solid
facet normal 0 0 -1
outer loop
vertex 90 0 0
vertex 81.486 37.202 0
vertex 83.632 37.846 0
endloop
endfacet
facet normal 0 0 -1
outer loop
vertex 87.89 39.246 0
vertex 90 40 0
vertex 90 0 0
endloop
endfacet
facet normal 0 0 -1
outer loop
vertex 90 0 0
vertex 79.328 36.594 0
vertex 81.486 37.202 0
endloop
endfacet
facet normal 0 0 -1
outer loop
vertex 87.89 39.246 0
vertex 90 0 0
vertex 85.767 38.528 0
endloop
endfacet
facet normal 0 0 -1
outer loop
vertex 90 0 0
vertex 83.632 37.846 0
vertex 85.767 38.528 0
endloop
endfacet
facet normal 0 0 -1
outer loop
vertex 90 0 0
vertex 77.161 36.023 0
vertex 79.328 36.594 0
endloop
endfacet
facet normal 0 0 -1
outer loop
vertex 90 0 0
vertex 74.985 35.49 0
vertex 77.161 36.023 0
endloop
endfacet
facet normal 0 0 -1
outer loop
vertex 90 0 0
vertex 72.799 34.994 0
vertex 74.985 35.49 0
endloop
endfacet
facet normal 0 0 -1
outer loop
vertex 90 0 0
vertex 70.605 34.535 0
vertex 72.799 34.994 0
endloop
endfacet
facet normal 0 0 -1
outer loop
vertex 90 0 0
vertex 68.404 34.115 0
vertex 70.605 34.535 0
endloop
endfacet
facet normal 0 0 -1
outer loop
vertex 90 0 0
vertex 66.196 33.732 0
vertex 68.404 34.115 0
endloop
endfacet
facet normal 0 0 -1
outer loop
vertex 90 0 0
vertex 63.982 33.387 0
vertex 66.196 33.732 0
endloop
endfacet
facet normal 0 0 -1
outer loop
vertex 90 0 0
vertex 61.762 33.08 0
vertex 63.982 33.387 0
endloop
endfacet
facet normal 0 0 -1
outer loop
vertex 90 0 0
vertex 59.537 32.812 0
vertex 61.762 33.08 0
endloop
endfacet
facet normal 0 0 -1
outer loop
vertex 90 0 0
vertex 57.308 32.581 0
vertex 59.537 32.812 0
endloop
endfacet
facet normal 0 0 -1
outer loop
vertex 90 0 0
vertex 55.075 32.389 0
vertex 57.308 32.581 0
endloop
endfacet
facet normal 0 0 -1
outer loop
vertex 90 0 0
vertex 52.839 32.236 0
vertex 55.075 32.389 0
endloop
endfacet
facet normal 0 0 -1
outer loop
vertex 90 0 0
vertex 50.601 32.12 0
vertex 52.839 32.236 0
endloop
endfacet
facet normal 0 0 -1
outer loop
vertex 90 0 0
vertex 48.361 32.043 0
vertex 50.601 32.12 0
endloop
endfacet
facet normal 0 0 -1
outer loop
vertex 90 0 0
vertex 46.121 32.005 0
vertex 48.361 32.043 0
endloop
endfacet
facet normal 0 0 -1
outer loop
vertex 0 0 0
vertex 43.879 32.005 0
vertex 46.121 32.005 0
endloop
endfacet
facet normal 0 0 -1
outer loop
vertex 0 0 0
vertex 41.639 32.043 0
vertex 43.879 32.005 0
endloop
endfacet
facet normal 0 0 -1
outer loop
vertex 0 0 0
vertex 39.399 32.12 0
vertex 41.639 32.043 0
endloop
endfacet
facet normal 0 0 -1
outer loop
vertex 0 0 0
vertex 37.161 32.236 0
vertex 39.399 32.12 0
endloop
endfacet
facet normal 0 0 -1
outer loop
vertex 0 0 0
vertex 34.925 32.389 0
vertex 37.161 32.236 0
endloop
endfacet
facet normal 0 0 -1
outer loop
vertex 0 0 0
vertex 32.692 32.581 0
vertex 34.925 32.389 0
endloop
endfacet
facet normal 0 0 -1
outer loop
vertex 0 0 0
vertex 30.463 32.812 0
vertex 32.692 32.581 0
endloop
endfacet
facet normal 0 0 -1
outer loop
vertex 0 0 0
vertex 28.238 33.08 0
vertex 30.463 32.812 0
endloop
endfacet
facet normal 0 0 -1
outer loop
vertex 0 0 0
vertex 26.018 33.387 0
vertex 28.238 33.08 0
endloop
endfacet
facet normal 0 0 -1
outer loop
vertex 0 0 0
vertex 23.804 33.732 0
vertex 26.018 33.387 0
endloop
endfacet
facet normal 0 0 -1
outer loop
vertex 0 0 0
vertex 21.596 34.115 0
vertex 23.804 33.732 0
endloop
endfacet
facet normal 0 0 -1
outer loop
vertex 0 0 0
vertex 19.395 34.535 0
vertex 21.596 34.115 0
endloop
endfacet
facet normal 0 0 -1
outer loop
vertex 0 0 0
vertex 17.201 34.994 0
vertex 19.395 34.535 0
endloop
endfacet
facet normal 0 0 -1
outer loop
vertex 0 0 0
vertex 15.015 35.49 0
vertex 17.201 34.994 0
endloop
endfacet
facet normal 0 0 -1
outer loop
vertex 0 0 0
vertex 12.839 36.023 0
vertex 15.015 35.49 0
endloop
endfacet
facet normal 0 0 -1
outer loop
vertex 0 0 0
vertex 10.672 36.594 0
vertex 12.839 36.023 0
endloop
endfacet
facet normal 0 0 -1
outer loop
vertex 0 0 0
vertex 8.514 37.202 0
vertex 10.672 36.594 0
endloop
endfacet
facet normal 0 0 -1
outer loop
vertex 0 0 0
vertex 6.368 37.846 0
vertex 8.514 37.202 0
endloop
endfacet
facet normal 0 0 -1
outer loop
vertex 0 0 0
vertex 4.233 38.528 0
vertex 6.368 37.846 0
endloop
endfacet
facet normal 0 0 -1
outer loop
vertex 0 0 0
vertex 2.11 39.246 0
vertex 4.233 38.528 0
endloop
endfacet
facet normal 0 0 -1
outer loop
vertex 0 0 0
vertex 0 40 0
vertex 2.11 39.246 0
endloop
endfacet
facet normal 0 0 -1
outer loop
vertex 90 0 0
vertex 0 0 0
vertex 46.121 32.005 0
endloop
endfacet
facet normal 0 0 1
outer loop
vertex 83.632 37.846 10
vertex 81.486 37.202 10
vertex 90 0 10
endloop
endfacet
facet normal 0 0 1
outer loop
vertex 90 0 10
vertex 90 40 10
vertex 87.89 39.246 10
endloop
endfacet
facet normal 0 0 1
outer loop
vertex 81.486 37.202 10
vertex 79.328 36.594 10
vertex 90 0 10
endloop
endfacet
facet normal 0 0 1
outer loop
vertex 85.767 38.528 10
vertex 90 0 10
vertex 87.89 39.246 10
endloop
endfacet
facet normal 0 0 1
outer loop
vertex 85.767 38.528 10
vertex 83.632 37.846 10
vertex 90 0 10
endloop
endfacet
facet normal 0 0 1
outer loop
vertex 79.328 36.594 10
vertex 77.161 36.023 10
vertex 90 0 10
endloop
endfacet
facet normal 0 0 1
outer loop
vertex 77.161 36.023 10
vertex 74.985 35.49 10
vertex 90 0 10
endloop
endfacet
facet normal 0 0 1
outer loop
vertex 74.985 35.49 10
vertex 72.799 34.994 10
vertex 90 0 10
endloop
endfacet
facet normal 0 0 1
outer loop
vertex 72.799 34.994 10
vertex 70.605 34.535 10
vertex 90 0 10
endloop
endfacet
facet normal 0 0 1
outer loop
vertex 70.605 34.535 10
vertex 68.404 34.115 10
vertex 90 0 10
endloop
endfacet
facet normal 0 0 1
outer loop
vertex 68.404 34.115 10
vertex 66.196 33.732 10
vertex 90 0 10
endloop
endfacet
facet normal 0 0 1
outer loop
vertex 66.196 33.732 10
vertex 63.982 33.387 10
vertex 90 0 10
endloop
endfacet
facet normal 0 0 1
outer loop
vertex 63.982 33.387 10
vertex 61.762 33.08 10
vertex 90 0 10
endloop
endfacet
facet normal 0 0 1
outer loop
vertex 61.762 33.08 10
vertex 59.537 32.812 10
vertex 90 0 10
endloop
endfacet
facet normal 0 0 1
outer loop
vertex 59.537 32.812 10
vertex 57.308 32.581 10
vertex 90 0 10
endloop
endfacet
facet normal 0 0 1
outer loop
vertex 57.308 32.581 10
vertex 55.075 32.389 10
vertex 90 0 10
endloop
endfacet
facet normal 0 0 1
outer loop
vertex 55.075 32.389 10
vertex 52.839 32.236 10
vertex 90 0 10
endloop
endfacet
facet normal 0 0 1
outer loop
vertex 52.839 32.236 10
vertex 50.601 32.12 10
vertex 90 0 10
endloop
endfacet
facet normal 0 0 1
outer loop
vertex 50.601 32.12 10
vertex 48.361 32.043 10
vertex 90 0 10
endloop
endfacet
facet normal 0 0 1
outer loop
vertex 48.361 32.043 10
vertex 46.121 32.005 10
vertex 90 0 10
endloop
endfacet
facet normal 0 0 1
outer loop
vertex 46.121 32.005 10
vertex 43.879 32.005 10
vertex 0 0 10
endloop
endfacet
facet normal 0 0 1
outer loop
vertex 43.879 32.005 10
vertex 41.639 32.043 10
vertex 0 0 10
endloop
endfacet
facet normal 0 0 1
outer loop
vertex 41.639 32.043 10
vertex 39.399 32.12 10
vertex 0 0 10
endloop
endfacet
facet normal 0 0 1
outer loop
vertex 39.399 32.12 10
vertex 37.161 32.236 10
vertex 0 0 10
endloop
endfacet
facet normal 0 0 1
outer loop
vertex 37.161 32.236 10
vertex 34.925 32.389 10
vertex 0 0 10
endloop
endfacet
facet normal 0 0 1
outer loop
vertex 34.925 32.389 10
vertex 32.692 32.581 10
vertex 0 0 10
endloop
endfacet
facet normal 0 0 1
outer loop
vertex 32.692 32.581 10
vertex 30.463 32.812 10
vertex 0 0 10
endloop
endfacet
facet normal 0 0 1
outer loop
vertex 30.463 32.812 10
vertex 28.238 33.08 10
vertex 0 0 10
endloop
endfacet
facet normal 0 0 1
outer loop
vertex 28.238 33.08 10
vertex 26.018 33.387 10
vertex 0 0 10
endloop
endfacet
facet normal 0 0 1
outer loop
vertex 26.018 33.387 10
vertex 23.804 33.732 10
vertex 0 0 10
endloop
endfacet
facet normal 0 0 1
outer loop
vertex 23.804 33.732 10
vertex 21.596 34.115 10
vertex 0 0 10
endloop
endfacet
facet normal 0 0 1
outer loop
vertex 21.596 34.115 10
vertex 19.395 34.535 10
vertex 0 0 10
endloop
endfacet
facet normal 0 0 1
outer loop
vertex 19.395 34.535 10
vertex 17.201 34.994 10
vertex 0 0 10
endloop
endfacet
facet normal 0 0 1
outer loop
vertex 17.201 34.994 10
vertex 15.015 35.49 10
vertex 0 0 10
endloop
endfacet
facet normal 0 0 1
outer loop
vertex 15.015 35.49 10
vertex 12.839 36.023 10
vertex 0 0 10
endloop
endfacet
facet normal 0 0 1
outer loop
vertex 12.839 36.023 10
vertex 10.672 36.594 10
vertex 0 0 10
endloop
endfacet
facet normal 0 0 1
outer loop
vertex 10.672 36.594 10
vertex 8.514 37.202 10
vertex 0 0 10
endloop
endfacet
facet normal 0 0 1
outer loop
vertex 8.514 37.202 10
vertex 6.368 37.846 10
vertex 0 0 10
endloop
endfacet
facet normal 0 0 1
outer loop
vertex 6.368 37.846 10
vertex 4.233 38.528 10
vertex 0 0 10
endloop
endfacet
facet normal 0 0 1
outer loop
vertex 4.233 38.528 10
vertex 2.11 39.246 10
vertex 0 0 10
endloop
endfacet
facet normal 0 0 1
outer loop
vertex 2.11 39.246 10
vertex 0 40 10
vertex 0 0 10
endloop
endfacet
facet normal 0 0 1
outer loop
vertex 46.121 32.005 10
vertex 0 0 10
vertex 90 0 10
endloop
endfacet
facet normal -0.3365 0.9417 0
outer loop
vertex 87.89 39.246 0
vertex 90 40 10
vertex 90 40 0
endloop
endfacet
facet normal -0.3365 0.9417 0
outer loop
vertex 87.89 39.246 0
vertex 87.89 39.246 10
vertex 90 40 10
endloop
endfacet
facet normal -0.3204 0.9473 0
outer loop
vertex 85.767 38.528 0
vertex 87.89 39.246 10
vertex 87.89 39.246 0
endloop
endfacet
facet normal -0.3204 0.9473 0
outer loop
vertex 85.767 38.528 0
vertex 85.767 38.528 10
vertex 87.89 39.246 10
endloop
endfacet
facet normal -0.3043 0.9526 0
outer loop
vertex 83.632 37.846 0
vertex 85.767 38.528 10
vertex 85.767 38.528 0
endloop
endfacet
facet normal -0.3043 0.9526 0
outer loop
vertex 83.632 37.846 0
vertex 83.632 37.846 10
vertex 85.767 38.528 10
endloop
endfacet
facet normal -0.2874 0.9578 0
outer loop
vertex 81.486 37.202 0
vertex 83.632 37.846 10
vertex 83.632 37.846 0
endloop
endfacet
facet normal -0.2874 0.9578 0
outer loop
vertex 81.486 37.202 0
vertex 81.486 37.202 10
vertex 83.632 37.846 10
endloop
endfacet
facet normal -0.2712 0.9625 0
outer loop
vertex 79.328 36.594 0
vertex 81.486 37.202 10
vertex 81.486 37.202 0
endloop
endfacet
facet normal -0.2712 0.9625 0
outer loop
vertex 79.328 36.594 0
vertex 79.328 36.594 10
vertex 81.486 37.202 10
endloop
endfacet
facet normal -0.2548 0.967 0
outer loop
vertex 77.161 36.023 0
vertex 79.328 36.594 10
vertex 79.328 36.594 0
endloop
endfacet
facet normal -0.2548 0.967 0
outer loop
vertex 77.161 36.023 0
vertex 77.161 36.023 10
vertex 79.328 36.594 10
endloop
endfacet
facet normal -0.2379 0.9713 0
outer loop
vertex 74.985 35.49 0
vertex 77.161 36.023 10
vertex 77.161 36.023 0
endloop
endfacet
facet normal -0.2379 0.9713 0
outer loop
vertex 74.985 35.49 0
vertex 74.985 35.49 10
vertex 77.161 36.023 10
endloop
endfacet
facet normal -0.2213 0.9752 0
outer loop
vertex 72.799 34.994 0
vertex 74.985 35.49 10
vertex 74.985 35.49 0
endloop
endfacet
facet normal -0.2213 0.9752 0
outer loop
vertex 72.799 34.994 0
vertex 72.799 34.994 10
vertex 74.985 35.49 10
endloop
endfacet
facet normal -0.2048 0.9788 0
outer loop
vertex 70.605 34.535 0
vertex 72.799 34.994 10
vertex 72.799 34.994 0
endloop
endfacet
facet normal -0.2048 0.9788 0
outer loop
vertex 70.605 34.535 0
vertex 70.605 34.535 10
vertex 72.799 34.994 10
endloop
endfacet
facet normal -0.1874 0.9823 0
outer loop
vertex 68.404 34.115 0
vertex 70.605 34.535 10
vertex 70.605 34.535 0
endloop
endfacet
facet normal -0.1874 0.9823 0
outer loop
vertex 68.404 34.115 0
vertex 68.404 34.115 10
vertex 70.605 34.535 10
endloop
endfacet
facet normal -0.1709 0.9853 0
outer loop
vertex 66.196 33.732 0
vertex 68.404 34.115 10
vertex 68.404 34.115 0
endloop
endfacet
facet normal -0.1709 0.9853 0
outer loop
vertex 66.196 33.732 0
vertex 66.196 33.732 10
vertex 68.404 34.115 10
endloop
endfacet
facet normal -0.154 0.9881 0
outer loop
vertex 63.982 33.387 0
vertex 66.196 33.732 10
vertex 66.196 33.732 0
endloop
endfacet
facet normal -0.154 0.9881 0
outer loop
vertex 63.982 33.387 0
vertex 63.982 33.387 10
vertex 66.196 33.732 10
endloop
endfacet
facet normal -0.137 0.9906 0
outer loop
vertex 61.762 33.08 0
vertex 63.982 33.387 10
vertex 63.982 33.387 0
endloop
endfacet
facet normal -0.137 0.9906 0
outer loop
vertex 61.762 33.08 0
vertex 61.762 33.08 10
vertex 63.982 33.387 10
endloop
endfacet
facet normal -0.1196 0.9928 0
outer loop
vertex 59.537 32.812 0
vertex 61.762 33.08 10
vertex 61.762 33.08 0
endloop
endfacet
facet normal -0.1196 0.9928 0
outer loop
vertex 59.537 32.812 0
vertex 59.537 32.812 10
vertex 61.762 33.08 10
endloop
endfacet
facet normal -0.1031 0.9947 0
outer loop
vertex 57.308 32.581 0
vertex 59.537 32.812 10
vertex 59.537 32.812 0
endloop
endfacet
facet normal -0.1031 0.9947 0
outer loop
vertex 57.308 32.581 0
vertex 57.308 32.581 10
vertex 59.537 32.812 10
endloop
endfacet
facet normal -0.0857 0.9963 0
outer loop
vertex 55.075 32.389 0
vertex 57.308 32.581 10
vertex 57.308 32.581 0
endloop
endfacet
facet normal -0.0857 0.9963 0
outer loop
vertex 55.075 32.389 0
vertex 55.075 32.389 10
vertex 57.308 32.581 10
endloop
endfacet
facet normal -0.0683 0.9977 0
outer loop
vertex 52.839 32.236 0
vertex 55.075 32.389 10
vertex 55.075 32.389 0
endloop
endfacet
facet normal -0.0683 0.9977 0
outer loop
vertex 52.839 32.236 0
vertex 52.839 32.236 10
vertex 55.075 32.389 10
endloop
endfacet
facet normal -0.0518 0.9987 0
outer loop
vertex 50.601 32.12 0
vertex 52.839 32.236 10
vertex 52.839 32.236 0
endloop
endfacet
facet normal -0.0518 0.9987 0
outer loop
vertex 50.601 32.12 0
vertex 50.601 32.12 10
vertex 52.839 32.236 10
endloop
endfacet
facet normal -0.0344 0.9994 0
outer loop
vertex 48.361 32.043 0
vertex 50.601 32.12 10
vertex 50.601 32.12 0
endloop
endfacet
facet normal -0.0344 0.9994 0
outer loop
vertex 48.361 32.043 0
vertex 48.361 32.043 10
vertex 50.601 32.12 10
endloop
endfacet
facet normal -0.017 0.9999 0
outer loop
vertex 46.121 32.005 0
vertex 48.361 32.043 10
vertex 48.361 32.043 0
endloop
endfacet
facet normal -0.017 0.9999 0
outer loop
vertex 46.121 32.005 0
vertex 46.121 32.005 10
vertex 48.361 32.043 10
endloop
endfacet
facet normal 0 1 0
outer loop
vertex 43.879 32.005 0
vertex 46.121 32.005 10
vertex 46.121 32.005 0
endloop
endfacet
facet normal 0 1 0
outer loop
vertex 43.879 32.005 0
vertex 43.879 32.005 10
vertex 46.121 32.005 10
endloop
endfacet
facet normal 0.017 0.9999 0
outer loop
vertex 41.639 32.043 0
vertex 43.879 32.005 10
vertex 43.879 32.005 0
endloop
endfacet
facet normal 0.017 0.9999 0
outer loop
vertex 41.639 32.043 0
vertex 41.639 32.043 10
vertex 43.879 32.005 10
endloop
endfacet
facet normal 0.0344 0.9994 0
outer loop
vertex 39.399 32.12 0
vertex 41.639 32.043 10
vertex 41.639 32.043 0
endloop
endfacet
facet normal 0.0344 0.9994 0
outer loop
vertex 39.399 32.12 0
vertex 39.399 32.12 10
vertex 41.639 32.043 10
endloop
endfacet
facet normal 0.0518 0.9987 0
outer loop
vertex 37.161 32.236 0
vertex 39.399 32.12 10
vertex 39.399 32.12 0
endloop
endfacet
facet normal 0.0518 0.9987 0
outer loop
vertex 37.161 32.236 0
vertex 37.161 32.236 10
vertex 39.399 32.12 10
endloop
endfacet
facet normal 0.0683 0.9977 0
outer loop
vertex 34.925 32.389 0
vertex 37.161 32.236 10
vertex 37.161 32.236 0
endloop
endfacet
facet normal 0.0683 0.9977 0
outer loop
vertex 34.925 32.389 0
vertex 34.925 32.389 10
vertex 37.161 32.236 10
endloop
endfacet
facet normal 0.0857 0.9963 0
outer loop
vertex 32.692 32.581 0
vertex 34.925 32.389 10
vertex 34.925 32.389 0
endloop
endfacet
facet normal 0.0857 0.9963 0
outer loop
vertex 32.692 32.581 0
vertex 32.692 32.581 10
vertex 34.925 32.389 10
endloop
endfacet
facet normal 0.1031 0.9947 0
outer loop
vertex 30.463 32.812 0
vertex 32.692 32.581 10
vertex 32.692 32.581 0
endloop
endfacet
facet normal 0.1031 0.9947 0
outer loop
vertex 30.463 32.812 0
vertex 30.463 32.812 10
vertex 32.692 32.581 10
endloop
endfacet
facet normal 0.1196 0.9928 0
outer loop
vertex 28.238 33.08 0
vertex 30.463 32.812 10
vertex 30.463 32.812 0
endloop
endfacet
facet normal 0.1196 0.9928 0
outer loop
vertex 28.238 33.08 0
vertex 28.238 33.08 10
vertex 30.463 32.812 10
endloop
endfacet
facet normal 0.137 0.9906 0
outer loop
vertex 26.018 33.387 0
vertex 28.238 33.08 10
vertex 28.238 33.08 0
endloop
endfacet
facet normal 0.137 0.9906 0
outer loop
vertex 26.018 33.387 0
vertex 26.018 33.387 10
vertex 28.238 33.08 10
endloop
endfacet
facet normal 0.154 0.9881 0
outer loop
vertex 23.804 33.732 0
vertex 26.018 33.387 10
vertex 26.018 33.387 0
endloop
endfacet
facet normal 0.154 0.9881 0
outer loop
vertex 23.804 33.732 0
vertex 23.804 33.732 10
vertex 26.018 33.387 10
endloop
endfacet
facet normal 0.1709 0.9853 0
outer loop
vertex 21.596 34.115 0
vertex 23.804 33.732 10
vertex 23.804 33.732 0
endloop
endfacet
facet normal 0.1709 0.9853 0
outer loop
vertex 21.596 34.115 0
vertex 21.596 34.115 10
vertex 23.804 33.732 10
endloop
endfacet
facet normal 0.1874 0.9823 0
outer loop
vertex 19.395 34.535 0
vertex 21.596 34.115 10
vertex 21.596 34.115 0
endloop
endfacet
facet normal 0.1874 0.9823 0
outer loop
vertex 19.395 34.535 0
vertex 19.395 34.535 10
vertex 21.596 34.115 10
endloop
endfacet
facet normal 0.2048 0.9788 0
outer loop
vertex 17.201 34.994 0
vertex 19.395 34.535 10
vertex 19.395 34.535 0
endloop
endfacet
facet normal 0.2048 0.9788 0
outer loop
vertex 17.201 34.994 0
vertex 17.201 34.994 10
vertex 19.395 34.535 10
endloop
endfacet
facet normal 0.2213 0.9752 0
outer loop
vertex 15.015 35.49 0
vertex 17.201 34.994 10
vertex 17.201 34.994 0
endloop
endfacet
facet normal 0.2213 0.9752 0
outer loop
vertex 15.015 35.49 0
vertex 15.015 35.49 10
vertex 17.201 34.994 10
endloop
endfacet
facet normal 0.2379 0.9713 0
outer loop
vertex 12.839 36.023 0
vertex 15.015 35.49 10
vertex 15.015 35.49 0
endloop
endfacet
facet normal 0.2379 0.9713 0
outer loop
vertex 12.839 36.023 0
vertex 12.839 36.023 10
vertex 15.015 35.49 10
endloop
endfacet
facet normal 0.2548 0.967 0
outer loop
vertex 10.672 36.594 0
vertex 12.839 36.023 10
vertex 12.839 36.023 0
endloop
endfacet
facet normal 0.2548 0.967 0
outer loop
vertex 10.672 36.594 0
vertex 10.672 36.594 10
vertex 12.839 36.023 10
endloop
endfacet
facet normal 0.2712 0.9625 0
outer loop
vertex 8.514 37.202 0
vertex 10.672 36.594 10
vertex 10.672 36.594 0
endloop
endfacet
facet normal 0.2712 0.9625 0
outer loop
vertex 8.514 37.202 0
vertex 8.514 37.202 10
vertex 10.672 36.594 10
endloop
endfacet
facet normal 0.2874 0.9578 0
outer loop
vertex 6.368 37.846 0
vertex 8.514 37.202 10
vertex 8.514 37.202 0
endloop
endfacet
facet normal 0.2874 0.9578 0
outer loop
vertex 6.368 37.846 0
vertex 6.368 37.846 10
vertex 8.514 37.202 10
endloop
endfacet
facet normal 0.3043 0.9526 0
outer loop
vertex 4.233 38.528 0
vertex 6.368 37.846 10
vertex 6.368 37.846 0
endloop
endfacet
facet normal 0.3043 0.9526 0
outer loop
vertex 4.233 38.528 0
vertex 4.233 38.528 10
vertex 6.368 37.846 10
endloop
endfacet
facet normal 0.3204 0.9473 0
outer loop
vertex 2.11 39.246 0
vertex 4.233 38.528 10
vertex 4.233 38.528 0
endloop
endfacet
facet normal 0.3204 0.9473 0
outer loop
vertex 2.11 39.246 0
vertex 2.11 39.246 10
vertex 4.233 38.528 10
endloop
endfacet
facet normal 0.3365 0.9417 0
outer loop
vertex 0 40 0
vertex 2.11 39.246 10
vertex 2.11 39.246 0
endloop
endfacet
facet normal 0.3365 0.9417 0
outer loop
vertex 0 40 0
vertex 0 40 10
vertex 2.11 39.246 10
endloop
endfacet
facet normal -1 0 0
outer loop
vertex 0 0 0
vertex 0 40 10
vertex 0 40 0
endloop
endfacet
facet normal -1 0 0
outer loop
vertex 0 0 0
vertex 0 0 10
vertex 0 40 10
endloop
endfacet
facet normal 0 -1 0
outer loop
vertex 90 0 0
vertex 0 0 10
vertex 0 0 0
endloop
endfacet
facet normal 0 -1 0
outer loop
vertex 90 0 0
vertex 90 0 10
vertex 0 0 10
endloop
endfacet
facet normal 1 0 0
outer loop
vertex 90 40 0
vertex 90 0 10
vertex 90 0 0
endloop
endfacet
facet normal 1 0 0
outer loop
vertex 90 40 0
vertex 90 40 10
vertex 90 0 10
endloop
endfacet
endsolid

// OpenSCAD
$fn = 32;

// ----------------------------------------------------------------------
// Arc profile plate: notch, 44 points
// ----------------------------------------------------------------------

// --- parameters (mm) ---
bar_l = 90;               // bar length, X
bar_w = 40;               // bar width, Y
notch_depth = 8;          // depth of the arc notch at mid-span
arc_r = 130.56;           // radius of the notch arc
arc_angle = 40.32;        // notch arc angle, degrees
arc_step = 1;             // sampling step of the notch arc, degrees
plate_t = 10;             // plate thickness, Z

profile = [[0, 0], [90, 0], [90, 40], [87.89, 39.246], [85.767, 38.528], [83.632, 37.846], [81.486, 37.202], [79.328, 36.594], [77.161, 36.023], [74.985, 35.49], [72.799, 34.994], [70.605, 34.535], [68.404, 34.115], [66.196, 33.732], [63.982, 33.387], [61.762, 33.08], [59.537, 32.812], [57.308, 32.581], [55.075, 32.389], [52.839, 32.236], [50.601, 32.12], [48.361, 32.043], [46.121, 32.005], [43.879, 32.005], [41.639, 32.043], [39.399, 32.12], [37.161, 32.236], [34.925, 32.389], [32.692, 32.581], [30.463, 32.812], [28.238, 33.08], [26.018, 33.387], [23.804, 33.732], [21.596, 34.115], [19.395, 34.535], [17.201, 34.994], [15.015, 35.49], [12.839, 36.023], [10.672, 36.594], [8.514, 37.202], [6.368, 37.846], [4.233, 38.528], [2.11, 39.246], [0, 40]];  // primary outline, 44 points, counter clockwise

// --- the one profile operation ---
linear_extrude(height = plate_t) polygon(points = profile);
